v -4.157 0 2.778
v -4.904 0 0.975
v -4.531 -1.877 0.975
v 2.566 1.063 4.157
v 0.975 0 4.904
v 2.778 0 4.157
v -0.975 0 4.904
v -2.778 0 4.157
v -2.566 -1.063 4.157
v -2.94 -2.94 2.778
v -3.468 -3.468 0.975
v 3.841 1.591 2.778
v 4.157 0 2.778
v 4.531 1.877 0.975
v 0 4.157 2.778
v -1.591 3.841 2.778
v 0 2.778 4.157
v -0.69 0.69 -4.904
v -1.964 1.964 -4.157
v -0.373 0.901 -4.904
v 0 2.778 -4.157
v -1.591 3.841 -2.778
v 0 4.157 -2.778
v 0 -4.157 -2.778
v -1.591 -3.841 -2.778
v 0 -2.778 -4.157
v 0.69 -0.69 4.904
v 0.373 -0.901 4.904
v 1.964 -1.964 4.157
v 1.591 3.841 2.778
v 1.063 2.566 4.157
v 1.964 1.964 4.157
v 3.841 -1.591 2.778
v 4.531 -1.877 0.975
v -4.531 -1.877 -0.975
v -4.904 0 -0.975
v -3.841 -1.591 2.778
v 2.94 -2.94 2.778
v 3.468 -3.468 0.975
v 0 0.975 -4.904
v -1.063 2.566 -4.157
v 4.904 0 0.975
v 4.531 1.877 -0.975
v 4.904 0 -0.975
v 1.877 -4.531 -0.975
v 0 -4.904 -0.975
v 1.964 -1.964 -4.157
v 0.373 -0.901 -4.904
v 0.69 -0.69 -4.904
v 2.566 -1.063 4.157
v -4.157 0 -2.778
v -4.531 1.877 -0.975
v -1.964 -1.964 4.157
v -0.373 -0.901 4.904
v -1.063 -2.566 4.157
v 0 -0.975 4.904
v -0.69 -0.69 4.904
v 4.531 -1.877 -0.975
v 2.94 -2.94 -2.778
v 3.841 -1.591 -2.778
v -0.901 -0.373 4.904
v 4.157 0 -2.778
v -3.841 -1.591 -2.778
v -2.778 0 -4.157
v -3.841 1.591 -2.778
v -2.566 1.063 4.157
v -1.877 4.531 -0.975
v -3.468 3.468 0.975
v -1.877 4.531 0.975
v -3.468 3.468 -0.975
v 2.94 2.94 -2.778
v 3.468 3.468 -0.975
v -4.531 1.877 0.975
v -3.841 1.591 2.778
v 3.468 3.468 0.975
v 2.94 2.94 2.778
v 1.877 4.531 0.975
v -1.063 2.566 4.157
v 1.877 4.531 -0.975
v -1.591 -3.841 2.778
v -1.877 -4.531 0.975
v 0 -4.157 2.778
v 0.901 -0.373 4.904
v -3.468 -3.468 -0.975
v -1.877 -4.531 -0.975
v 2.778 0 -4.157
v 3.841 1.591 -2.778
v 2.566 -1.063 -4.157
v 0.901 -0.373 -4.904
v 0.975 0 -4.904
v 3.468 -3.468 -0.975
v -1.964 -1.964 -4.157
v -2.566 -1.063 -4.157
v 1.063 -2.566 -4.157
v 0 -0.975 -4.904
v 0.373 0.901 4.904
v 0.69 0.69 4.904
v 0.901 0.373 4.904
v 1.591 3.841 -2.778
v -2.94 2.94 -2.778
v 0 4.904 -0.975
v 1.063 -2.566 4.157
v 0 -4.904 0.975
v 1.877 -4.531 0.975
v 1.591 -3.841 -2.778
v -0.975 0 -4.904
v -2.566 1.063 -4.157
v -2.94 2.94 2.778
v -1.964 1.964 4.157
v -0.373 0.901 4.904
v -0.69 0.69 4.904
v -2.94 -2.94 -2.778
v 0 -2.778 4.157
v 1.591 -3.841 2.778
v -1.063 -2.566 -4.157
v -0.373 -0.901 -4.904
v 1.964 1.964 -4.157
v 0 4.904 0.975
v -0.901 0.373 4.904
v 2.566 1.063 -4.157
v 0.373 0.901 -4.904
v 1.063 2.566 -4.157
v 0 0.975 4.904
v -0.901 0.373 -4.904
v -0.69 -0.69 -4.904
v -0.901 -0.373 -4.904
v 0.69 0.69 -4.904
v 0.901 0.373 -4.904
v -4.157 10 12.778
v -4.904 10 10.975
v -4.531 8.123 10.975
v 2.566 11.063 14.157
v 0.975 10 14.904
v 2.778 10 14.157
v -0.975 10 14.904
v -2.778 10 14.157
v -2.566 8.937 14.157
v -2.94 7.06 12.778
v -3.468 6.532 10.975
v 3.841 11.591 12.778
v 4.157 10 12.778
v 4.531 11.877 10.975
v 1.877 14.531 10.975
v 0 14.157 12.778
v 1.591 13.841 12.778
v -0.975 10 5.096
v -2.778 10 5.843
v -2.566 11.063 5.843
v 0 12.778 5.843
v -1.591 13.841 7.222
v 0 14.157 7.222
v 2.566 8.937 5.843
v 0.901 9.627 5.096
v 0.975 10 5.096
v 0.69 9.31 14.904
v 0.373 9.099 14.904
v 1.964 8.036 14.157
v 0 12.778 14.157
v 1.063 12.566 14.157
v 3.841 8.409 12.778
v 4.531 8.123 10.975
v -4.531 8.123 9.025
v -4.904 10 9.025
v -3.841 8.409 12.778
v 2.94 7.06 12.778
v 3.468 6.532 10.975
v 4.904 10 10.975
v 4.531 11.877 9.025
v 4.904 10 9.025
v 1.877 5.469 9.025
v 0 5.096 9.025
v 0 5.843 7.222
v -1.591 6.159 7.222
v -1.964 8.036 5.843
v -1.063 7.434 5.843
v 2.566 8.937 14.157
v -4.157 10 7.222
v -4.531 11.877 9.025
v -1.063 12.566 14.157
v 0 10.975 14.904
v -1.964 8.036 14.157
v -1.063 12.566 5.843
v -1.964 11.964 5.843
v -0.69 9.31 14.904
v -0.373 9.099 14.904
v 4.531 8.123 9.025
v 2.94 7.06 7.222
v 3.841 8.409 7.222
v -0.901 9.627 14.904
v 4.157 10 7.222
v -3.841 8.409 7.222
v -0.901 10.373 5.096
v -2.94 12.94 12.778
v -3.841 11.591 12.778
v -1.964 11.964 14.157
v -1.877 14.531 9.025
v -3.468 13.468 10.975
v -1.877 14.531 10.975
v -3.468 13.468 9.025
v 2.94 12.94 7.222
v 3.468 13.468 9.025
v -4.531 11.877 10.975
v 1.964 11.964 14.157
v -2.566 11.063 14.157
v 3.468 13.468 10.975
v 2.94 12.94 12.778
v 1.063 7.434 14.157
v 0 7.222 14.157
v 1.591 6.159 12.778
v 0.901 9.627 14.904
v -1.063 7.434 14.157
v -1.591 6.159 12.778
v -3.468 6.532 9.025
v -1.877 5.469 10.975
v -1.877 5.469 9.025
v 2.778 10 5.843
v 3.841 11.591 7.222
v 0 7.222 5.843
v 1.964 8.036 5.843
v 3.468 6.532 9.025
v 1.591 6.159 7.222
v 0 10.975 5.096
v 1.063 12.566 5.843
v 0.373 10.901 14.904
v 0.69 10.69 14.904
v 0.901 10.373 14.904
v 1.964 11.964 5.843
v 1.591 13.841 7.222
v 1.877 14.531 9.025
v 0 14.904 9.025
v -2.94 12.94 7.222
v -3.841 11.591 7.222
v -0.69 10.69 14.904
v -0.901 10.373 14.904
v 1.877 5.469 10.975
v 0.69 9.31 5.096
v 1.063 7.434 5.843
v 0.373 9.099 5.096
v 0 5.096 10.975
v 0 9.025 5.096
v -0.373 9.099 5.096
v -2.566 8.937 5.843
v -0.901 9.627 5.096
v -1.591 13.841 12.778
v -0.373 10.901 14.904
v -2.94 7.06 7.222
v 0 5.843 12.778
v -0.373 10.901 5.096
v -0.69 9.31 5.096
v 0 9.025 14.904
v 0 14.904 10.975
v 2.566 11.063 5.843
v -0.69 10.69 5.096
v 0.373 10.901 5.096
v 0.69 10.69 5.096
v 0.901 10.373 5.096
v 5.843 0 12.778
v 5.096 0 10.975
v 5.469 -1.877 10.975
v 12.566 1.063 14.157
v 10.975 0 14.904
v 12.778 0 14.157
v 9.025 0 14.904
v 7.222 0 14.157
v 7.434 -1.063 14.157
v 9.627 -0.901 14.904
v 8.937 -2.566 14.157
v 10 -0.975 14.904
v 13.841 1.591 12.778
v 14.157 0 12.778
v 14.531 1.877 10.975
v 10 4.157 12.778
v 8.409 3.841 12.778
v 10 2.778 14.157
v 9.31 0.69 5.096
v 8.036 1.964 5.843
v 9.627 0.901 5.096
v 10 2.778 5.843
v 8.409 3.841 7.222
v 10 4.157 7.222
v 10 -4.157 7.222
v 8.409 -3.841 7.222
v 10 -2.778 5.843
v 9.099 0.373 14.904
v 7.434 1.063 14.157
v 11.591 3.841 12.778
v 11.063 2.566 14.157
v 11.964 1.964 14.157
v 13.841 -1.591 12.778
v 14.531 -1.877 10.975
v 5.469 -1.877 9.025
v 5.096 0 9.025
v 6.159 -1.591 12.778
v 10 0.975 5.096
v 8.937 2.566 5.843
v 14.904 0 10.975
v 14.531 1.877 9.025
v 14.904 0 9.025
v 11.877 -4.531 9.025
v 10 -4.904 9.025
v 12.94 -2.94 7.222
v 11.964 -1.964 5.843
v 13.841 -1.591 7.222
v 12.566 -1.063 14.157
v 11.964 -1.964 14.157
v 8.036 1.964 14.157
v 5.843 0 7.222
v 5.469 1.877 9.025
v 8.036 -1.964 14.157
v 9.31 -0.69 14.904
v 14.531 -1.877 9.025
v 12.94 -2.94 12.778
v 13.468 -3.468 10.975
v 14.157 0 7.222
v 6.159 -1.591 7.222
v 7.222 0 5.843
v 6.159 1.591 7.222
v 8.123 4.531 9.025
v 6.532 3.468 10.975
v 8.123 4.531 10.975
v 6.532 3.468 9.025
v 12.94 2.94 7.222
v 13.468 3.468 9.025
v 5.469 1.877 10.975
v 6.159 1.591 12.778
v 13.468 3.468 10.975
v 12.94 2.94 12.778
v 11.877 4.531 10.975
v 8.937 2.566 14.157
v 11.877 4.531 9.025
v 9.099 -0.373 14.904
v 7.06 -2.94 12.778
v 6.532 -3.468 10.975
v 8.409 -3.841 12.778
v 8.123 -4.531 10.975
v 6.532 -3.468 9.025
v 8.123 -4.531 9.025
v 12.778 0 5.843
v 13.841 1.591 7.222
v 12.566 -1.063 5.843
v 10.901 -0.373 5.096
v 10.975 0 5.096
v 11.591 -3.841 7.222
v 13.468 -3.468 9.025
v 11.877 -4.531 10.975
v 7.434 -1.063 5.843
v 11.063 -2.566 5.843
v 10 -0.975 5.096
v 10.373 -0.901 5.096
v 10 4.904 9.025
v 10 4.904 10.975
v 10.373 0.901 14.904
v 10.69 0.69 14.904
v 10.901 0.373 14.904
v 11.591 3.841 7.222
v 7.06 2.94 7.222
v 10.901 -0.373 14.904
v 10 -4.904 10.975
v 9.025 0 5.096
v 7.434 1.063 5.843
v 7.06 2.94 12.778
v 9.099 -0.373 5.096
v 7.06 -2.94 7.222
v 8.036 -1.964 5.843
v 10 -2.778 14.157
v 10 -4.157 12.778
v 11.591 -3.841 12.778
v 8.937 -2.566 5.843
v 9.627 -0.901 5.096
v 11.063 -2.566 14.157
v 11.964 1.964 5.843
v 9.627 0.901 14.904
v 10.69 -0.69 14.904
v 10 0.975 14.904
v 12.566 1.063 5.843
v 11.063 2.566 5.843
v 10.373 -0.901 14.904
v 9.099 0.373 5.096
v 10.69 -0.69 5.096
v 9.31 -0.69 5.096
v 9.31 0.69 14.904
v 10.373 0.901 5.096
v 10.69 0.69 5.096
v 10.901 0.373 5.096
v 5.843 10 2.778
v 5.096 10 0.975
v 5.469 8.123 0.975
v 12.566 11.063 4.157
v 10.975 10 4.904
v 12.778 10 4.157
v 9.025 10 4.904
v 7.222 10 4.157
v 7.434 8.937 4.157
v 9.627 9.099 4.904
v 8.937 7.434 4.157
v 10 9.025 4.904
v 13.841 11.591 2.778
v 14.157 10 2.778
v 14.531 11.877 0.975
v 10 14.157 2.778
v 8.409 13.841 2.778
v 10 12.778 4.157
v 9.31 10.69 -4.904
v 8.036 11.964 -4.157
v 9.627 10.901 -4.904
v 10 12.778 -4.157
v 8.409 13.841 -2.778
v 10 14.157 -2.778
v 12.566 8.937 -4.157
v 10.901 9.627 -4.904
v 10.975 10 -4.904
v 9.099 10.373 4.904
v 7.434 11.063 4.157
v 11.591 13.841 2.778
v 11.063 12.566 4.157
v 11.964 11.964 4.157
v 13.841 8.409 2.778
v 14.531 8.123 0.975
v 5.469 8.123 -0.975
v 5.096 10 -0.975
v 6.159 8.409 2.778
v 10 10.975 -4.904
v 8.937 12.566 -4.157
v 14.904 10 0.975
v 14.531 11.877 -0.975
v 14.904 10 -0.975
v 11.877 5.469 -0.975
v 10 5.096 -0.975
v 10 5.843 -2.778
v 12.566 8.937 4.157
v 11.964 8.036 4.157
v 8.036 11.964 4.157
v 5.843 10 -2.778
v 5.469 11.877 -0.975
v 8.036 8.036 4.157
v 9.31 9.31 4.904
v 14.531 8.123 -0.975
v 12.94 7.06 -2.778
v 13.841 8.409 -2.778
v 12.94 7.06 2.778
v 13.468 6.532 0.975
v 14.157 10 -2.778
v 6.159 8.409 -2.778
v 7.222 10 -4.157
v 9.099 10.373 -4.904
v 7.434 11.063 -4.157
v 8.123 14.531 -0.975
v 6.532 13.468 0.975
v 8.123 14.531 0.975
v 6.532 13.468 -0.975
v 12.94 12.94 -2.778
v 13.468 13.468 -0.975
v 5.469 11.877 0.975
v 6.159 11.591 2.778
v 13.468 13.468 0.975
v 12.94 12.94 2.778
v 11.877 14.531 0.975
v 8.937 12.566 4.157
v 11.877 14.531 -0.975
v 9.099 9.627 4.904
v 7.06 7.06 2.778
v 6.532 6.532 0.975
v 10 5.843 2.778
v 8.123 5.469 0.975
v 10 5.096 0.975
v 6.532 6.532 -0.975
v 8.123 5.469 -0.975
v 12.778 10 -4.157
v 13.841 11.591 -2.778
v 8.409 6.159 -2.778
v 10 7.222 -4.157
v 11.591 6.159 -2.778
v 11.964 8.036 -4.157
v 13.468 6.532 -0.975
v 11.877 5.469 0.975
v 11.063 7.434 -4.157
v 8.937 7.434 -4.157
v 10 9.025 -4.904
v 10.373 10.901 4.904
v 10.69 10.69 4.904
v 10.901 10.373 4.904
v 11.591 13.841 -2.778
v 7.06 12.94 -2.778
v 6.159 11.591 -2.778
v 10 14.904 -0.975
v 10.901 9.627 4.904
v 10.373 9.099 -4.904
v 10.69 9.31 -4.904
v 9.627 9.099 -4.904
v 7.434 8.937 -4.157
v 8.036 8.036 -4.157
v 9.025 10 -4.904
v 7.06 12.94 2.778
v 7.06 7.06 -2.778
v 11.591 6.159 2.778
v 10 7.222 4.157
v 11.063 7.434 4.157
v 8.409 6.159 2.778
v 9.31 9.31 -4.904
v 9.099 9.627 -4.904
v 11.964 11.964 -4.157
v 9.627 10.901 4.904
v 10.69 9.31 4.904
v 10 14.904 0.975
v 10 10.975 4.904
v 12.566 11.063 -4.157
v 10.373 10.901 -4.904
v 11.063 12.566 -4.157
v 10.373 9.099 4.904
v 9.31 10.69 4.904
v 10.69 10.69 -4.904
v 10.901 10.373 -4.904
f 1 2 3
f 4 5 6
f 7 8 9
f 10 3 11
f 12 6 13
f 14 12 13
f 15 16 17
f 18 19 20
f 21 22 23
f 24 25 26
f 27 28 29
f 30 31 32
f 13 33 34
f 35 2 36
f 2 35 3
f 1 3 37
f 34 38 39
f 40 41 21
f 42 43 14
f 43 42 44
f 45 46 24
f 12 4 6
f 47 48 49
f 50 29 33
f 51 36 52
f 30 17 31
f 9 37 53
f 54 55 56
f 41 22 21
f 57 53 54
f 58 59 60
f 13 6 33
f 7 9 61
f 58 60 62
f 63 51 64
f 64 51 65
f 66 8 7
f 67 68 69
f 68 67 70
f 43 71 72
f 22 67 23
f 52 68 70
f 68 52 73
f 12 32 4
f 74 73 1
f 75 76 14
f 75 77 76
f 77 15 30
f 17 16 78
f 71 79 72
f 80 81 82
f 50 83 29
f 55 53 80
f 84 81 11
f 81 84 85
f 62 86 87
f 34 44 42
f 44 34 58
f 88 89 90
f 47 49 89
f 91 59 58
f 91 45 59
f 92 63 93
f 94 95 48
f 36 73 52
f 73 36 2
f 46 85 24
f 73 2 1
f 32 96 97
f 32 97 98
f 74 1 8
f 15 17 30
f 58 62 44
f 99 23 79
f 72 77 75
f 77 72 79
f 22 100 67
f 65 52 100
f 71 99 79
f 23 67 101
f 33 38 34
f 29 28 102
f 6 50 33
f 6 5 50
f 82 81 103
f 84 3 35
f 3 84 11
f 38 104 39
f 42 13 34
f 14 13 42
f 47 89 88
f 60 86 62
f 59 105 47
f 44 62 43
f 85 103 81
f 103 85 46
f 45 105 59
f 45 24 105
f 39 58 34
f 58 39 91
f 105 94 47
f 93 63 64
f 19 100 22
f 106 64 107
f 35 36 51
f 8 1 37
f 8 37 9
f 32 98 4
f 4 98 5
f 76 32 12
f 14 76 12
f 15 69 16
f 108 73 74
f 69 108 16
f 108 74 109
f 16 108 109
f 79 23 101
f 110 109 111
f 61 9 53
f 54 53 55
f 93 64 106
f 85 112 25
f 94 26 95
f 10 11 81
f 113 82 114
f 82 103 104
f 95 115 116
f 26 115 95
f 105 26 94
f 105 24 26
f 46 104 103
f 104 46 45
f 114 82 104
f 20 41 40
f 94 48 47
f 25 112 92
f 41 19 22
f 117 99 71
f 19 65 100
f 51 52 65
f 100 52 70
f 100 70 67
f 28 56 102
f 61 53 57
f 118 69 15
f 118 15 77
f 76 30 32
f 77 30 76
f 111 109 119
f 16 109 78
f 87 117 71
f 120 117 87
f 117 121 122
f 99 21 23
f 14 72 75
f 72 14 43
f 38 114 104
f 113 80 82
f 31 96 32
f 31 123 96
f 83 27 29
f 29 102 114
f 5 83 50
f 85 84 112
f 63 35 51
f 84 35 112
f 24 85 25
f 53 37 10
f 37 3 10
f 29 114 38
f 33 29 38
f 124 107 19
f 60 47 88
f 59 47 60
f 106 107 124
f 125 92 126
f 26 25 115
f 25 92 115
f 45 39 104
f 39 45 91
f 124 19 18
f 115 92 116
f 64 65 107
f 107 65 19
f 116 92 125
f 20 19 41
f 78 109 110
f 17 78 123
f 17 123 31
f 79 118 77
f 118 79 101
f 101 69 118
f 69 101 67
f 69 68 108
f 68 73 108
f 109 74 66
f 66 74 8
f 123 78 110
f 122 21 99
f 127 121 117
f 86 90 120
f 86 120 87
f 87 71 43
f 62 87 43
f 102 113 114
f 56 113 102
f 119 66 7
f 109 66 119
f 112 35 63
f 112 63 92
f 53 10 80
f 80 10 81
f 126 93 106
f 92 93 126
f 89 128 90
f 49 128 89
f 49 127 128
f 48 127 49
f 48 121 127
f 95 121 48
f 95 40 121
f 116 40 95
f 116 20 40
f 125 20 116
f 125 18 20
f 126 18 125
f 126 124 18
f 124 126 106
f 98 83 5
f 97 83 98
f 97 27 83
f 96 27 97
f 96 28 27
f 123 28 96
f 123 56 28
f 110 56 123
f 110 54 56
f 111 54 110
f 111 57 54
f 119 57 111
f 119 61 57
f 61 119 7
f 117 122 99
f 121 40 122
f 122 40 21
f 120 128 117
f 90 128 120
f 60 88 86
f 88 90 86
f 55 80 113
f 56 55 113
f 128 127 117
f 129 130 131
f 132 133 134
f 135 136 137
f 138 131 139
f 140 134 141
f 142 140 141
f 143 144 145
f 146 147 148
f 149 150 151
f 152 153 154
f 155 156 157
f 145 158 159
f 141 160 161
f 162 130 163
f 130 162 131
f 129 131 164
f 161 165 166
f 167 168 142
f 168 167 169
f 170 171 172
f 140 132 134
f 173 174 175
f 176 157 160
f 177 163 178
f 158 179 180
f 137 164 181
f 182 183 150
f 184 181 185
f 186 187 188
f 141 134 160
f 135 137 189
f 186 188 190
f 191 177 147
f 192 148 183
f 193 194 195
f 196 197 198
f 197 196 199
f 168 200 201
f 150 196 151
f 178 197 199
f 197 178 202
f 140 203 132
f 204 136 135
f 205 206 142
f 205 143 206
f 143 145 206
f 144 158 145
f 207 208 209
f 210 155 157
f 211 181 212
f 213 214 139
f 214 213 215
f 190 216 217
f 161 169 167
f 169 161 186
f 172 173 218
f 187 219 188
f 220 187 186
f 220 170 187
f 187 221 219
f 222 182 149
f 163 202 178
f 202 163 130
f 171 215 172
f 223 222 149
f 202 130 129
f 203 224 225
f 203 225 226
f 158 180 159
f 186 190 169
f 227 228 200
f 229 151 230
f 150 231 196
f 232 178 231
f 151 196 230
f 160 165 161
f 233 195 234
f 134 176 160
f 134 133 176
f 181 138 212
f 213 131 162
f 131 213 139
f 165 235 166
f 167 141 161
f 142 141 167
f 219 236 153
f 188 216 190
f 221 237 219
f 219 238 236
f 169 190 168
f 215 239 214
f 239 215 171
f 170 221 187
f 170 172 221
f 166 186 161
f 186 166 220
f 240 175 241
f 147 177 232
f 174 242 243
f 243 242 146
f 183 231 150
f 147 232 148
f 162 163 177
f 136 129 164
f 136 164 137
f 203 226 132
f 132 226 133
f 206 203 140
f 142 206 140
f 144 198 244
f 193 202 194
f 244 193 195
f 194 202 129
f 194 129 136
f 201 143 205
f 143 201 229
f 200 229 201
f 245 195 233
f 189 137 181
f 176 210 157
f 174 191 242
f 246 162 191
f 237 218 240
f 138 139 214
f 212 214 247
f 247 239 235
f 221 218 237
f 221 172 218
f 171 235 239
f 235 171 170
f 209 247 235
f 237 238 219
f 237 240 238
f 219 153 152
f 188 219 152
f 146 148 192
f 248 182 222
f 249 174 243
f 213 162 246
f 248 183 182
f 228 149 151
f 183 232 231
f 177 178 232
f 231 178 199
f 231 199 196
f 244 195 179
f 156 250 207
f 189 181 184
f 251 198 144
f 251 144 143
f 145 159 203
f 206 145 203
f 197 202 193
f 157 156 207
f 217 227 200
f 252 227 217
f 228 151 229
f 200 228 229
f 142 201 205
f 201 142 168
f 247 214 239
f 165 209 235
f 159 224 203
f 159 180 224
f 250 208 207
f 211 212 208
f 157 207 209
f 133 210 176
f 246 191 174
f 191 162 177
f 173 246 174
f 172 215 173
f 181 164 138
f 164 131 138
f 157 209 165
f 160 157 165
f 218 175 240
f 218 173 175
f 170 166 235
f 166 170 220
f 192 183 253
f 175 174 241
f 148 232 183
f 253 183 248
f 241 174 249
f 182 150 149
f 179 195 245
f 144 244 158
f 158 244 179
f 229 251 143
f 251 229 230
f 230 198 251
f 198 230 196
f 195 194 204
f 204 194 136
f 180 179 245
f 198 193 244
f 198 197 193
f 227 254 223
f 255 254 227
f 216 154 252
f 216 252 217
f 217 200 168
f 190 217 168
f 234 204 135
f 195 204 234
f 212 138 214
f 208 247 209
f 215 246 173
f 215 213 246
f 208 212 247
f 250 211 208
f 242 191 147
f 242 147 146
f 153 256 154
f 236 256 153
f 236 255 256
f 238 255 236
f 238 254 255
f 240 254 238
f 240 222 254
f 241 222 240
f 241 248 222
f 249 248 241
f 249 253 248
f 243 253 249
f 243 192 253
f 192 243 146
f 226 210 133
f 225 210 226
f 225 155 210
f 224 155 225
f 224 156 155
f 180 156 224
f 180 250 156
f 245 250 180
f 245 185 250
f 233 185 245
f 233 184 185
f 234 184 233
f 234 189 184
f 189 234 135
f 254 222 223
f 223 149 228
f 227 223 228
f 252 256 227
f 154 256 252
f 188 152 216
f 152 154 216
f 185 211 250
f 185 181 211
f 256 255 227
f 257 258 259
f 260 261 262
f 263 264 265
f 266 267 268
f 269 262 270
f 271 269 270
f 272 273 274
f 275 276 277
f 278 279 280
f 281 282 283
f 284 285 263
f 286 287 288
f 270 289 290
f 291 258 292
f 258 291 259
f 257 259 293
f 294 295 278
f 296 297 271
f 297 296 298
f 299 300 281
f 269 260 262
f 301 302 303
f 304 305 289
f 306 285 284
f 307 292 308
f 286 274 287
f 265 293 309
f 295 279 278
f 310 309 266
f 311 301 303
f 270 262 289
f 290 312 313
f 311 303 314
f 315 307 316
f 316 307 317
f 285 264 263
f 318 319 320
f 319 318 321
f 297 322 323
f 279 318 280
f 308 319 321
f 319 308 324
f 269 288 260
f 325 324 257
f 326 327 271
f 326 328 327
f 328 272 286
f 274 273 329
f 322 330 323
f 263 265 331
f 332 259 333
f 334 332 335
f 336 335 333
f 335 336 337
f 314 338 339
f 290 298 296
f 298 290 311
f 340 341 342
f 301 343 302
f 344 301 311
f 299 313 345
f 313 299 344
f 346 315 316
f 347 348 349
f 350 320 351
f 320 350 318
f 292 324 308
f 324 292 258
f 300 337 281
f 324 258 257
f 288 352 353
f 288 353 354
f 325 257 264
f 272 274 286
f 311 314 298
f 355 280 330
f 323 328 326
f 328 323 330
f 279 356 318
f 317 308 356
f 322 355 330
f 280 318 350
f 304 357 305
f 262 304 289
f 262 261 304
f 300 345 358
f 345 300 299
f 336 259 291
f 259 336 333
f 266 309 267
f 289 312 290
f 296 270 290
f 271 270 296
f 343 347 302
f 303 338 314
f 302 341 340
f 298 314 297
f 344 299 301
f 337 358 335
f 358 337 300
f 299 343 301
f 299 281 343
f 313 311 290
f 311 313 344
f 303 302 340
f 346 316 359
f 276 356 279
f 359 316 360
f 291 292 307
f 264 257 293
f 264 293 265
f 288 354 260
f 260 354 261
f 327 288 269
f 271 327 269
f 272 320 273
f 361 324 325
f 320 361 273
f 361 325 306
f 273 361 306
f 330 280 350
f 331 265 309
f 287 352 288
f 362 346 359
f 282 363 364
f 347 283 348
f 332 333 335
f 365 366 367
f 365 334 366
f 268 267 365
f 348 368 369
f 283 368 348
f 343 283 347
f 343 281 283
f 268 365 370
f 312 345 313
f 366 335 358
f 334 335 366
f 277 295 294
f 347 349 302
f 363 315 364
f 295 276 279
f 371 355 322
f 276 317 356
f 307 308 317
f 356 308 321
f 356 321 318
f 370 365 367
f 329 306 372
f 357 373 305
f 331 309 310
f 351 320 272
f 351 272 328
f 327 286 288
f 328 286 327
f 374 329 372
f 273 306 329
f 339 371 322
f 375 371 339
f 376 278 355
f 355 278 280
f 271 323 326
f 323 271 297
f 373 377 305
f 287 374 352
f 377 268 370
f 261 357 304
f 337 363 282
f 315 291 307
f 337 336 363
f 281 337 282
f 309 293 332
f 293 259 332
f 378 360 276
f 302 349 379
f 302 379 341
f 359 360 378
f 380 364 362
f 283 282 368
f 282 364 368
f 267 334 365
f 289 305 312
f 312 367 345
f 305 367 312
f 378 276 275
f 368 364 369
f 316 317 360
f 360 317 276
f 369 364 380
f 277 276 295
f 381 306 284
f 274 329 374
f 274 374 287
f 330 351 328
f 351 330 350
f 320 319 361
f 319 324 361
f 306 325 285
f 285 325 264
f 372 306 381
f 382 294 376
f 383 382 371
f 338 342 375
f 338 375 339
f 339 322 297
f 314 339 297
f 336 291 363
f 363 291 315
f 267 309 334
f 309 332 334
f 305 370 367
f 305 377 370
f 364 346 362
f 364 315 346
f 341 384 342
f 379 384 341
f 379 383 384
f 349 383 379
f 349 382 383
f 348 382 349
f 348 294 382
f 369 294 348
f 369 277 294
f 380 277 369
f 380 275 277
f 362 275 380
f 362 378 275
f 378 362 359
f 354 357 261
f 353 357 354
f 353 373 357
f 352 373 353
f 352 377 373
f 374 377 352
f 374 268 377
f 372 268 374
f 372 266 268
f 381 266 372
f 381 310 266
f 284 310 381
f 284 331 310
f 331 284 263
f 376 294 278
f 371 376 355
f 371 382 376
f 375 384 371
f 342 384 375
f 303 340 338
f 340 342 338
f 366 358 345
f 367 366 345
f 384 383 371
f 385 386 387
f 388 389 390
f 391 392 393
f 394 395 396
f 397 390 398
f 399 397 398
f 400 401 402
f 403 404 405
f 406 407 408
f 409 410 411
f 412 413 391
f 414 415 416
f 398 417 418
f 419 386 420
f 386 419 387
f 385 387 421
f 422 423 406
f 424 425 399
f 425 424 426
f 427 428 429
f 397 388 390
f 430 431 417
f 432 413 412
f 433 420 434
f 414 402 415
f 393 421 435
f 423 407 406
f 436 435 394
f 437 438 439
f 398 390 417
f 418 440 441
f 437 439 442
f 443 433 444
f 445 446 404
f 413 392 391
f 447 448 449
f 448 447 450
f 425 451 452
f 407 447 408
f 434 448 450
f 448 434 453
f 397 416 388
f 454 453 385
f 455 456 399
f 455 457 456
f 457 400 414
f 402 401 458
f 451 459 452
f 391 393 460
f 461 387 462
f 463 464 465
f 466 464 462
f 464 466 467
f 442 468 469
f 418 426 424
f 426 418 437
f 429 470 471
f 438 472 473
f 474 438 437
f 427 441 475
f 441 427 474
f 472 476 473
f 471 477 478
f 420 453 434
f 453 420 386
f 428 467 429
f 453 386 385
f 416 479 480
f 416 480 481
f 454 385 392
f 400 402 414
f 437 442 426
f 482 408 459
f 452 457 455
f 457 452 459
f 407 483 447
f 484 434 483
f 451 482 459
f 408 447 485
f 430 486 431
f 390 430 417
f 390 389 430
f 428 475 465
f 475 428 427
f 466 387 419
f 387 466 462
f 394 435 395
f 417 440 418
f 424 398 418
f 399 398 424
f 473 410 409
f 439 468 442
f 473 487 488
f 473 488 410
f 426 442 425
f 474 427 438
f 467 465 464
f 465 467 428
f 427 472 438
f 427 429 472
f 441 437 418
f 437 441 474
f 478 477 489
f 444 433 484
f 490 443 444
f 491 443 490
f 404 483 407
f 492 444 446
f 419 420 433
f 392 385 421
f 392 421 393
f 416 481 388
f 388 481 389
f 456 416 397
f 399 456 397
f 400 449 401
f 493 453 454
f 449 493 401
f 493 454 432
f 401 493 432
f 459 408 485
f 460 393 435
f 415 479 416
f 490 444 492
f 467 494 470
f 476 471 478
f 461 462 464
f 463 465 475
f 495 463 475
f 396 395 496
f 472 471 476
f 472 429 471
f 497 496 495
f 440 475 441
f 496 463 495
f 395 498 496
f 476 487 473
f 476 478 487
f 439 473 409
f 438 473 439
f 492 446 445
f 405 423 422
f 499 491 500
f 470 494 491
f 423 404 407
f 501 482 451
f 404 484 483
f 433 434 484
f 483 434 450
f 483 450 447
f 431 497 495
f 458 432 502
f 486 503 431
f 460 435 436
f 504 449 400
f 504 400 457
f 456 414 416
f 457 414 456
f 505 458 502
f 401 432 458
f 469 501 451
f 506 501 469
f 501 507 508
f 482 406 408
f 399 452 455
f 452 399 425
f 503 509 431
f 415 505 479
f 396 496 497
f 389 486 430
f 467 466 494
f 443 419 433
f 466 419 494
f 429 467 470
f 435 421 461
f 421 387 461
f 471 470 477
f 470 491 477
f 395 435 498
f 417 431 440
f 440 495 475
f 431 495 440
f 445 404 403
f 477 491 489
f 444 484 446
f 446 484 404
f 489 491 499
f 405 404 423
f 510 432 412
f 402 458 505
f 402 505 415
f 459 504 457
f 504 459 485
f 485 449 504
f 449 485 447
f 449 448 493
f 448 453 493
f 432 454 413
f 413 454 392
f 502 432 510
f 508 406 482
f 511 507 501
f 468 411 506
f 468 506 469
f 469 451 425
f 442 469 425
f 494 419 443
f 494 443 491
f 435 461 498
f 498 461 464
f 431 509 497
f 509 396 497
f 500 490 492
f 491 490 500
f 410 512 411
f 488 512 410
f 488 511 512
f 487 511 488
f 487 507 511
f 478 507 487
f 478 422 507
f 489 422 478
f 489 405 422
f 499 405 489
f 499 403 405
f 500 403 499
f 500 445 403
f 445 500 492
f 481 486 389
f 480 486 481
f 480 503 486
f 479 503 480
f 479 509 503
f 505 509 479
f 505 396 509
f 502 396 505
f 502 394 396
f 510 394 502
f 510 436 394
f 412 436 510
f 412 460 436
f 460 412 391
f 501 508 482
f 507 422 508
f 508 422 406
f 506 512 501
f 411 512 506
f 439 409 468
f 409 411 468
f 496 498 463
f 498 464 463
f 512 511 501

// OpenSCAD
//hull(){
    translate([0, 0, 0]){sphere(r=5);}
    translate([0,10,10]){sphere(r=5);}
    translate([10,0,10]){sphere(r=5);}
    translate([10,10,0]){sphere(r=5);}
//}
